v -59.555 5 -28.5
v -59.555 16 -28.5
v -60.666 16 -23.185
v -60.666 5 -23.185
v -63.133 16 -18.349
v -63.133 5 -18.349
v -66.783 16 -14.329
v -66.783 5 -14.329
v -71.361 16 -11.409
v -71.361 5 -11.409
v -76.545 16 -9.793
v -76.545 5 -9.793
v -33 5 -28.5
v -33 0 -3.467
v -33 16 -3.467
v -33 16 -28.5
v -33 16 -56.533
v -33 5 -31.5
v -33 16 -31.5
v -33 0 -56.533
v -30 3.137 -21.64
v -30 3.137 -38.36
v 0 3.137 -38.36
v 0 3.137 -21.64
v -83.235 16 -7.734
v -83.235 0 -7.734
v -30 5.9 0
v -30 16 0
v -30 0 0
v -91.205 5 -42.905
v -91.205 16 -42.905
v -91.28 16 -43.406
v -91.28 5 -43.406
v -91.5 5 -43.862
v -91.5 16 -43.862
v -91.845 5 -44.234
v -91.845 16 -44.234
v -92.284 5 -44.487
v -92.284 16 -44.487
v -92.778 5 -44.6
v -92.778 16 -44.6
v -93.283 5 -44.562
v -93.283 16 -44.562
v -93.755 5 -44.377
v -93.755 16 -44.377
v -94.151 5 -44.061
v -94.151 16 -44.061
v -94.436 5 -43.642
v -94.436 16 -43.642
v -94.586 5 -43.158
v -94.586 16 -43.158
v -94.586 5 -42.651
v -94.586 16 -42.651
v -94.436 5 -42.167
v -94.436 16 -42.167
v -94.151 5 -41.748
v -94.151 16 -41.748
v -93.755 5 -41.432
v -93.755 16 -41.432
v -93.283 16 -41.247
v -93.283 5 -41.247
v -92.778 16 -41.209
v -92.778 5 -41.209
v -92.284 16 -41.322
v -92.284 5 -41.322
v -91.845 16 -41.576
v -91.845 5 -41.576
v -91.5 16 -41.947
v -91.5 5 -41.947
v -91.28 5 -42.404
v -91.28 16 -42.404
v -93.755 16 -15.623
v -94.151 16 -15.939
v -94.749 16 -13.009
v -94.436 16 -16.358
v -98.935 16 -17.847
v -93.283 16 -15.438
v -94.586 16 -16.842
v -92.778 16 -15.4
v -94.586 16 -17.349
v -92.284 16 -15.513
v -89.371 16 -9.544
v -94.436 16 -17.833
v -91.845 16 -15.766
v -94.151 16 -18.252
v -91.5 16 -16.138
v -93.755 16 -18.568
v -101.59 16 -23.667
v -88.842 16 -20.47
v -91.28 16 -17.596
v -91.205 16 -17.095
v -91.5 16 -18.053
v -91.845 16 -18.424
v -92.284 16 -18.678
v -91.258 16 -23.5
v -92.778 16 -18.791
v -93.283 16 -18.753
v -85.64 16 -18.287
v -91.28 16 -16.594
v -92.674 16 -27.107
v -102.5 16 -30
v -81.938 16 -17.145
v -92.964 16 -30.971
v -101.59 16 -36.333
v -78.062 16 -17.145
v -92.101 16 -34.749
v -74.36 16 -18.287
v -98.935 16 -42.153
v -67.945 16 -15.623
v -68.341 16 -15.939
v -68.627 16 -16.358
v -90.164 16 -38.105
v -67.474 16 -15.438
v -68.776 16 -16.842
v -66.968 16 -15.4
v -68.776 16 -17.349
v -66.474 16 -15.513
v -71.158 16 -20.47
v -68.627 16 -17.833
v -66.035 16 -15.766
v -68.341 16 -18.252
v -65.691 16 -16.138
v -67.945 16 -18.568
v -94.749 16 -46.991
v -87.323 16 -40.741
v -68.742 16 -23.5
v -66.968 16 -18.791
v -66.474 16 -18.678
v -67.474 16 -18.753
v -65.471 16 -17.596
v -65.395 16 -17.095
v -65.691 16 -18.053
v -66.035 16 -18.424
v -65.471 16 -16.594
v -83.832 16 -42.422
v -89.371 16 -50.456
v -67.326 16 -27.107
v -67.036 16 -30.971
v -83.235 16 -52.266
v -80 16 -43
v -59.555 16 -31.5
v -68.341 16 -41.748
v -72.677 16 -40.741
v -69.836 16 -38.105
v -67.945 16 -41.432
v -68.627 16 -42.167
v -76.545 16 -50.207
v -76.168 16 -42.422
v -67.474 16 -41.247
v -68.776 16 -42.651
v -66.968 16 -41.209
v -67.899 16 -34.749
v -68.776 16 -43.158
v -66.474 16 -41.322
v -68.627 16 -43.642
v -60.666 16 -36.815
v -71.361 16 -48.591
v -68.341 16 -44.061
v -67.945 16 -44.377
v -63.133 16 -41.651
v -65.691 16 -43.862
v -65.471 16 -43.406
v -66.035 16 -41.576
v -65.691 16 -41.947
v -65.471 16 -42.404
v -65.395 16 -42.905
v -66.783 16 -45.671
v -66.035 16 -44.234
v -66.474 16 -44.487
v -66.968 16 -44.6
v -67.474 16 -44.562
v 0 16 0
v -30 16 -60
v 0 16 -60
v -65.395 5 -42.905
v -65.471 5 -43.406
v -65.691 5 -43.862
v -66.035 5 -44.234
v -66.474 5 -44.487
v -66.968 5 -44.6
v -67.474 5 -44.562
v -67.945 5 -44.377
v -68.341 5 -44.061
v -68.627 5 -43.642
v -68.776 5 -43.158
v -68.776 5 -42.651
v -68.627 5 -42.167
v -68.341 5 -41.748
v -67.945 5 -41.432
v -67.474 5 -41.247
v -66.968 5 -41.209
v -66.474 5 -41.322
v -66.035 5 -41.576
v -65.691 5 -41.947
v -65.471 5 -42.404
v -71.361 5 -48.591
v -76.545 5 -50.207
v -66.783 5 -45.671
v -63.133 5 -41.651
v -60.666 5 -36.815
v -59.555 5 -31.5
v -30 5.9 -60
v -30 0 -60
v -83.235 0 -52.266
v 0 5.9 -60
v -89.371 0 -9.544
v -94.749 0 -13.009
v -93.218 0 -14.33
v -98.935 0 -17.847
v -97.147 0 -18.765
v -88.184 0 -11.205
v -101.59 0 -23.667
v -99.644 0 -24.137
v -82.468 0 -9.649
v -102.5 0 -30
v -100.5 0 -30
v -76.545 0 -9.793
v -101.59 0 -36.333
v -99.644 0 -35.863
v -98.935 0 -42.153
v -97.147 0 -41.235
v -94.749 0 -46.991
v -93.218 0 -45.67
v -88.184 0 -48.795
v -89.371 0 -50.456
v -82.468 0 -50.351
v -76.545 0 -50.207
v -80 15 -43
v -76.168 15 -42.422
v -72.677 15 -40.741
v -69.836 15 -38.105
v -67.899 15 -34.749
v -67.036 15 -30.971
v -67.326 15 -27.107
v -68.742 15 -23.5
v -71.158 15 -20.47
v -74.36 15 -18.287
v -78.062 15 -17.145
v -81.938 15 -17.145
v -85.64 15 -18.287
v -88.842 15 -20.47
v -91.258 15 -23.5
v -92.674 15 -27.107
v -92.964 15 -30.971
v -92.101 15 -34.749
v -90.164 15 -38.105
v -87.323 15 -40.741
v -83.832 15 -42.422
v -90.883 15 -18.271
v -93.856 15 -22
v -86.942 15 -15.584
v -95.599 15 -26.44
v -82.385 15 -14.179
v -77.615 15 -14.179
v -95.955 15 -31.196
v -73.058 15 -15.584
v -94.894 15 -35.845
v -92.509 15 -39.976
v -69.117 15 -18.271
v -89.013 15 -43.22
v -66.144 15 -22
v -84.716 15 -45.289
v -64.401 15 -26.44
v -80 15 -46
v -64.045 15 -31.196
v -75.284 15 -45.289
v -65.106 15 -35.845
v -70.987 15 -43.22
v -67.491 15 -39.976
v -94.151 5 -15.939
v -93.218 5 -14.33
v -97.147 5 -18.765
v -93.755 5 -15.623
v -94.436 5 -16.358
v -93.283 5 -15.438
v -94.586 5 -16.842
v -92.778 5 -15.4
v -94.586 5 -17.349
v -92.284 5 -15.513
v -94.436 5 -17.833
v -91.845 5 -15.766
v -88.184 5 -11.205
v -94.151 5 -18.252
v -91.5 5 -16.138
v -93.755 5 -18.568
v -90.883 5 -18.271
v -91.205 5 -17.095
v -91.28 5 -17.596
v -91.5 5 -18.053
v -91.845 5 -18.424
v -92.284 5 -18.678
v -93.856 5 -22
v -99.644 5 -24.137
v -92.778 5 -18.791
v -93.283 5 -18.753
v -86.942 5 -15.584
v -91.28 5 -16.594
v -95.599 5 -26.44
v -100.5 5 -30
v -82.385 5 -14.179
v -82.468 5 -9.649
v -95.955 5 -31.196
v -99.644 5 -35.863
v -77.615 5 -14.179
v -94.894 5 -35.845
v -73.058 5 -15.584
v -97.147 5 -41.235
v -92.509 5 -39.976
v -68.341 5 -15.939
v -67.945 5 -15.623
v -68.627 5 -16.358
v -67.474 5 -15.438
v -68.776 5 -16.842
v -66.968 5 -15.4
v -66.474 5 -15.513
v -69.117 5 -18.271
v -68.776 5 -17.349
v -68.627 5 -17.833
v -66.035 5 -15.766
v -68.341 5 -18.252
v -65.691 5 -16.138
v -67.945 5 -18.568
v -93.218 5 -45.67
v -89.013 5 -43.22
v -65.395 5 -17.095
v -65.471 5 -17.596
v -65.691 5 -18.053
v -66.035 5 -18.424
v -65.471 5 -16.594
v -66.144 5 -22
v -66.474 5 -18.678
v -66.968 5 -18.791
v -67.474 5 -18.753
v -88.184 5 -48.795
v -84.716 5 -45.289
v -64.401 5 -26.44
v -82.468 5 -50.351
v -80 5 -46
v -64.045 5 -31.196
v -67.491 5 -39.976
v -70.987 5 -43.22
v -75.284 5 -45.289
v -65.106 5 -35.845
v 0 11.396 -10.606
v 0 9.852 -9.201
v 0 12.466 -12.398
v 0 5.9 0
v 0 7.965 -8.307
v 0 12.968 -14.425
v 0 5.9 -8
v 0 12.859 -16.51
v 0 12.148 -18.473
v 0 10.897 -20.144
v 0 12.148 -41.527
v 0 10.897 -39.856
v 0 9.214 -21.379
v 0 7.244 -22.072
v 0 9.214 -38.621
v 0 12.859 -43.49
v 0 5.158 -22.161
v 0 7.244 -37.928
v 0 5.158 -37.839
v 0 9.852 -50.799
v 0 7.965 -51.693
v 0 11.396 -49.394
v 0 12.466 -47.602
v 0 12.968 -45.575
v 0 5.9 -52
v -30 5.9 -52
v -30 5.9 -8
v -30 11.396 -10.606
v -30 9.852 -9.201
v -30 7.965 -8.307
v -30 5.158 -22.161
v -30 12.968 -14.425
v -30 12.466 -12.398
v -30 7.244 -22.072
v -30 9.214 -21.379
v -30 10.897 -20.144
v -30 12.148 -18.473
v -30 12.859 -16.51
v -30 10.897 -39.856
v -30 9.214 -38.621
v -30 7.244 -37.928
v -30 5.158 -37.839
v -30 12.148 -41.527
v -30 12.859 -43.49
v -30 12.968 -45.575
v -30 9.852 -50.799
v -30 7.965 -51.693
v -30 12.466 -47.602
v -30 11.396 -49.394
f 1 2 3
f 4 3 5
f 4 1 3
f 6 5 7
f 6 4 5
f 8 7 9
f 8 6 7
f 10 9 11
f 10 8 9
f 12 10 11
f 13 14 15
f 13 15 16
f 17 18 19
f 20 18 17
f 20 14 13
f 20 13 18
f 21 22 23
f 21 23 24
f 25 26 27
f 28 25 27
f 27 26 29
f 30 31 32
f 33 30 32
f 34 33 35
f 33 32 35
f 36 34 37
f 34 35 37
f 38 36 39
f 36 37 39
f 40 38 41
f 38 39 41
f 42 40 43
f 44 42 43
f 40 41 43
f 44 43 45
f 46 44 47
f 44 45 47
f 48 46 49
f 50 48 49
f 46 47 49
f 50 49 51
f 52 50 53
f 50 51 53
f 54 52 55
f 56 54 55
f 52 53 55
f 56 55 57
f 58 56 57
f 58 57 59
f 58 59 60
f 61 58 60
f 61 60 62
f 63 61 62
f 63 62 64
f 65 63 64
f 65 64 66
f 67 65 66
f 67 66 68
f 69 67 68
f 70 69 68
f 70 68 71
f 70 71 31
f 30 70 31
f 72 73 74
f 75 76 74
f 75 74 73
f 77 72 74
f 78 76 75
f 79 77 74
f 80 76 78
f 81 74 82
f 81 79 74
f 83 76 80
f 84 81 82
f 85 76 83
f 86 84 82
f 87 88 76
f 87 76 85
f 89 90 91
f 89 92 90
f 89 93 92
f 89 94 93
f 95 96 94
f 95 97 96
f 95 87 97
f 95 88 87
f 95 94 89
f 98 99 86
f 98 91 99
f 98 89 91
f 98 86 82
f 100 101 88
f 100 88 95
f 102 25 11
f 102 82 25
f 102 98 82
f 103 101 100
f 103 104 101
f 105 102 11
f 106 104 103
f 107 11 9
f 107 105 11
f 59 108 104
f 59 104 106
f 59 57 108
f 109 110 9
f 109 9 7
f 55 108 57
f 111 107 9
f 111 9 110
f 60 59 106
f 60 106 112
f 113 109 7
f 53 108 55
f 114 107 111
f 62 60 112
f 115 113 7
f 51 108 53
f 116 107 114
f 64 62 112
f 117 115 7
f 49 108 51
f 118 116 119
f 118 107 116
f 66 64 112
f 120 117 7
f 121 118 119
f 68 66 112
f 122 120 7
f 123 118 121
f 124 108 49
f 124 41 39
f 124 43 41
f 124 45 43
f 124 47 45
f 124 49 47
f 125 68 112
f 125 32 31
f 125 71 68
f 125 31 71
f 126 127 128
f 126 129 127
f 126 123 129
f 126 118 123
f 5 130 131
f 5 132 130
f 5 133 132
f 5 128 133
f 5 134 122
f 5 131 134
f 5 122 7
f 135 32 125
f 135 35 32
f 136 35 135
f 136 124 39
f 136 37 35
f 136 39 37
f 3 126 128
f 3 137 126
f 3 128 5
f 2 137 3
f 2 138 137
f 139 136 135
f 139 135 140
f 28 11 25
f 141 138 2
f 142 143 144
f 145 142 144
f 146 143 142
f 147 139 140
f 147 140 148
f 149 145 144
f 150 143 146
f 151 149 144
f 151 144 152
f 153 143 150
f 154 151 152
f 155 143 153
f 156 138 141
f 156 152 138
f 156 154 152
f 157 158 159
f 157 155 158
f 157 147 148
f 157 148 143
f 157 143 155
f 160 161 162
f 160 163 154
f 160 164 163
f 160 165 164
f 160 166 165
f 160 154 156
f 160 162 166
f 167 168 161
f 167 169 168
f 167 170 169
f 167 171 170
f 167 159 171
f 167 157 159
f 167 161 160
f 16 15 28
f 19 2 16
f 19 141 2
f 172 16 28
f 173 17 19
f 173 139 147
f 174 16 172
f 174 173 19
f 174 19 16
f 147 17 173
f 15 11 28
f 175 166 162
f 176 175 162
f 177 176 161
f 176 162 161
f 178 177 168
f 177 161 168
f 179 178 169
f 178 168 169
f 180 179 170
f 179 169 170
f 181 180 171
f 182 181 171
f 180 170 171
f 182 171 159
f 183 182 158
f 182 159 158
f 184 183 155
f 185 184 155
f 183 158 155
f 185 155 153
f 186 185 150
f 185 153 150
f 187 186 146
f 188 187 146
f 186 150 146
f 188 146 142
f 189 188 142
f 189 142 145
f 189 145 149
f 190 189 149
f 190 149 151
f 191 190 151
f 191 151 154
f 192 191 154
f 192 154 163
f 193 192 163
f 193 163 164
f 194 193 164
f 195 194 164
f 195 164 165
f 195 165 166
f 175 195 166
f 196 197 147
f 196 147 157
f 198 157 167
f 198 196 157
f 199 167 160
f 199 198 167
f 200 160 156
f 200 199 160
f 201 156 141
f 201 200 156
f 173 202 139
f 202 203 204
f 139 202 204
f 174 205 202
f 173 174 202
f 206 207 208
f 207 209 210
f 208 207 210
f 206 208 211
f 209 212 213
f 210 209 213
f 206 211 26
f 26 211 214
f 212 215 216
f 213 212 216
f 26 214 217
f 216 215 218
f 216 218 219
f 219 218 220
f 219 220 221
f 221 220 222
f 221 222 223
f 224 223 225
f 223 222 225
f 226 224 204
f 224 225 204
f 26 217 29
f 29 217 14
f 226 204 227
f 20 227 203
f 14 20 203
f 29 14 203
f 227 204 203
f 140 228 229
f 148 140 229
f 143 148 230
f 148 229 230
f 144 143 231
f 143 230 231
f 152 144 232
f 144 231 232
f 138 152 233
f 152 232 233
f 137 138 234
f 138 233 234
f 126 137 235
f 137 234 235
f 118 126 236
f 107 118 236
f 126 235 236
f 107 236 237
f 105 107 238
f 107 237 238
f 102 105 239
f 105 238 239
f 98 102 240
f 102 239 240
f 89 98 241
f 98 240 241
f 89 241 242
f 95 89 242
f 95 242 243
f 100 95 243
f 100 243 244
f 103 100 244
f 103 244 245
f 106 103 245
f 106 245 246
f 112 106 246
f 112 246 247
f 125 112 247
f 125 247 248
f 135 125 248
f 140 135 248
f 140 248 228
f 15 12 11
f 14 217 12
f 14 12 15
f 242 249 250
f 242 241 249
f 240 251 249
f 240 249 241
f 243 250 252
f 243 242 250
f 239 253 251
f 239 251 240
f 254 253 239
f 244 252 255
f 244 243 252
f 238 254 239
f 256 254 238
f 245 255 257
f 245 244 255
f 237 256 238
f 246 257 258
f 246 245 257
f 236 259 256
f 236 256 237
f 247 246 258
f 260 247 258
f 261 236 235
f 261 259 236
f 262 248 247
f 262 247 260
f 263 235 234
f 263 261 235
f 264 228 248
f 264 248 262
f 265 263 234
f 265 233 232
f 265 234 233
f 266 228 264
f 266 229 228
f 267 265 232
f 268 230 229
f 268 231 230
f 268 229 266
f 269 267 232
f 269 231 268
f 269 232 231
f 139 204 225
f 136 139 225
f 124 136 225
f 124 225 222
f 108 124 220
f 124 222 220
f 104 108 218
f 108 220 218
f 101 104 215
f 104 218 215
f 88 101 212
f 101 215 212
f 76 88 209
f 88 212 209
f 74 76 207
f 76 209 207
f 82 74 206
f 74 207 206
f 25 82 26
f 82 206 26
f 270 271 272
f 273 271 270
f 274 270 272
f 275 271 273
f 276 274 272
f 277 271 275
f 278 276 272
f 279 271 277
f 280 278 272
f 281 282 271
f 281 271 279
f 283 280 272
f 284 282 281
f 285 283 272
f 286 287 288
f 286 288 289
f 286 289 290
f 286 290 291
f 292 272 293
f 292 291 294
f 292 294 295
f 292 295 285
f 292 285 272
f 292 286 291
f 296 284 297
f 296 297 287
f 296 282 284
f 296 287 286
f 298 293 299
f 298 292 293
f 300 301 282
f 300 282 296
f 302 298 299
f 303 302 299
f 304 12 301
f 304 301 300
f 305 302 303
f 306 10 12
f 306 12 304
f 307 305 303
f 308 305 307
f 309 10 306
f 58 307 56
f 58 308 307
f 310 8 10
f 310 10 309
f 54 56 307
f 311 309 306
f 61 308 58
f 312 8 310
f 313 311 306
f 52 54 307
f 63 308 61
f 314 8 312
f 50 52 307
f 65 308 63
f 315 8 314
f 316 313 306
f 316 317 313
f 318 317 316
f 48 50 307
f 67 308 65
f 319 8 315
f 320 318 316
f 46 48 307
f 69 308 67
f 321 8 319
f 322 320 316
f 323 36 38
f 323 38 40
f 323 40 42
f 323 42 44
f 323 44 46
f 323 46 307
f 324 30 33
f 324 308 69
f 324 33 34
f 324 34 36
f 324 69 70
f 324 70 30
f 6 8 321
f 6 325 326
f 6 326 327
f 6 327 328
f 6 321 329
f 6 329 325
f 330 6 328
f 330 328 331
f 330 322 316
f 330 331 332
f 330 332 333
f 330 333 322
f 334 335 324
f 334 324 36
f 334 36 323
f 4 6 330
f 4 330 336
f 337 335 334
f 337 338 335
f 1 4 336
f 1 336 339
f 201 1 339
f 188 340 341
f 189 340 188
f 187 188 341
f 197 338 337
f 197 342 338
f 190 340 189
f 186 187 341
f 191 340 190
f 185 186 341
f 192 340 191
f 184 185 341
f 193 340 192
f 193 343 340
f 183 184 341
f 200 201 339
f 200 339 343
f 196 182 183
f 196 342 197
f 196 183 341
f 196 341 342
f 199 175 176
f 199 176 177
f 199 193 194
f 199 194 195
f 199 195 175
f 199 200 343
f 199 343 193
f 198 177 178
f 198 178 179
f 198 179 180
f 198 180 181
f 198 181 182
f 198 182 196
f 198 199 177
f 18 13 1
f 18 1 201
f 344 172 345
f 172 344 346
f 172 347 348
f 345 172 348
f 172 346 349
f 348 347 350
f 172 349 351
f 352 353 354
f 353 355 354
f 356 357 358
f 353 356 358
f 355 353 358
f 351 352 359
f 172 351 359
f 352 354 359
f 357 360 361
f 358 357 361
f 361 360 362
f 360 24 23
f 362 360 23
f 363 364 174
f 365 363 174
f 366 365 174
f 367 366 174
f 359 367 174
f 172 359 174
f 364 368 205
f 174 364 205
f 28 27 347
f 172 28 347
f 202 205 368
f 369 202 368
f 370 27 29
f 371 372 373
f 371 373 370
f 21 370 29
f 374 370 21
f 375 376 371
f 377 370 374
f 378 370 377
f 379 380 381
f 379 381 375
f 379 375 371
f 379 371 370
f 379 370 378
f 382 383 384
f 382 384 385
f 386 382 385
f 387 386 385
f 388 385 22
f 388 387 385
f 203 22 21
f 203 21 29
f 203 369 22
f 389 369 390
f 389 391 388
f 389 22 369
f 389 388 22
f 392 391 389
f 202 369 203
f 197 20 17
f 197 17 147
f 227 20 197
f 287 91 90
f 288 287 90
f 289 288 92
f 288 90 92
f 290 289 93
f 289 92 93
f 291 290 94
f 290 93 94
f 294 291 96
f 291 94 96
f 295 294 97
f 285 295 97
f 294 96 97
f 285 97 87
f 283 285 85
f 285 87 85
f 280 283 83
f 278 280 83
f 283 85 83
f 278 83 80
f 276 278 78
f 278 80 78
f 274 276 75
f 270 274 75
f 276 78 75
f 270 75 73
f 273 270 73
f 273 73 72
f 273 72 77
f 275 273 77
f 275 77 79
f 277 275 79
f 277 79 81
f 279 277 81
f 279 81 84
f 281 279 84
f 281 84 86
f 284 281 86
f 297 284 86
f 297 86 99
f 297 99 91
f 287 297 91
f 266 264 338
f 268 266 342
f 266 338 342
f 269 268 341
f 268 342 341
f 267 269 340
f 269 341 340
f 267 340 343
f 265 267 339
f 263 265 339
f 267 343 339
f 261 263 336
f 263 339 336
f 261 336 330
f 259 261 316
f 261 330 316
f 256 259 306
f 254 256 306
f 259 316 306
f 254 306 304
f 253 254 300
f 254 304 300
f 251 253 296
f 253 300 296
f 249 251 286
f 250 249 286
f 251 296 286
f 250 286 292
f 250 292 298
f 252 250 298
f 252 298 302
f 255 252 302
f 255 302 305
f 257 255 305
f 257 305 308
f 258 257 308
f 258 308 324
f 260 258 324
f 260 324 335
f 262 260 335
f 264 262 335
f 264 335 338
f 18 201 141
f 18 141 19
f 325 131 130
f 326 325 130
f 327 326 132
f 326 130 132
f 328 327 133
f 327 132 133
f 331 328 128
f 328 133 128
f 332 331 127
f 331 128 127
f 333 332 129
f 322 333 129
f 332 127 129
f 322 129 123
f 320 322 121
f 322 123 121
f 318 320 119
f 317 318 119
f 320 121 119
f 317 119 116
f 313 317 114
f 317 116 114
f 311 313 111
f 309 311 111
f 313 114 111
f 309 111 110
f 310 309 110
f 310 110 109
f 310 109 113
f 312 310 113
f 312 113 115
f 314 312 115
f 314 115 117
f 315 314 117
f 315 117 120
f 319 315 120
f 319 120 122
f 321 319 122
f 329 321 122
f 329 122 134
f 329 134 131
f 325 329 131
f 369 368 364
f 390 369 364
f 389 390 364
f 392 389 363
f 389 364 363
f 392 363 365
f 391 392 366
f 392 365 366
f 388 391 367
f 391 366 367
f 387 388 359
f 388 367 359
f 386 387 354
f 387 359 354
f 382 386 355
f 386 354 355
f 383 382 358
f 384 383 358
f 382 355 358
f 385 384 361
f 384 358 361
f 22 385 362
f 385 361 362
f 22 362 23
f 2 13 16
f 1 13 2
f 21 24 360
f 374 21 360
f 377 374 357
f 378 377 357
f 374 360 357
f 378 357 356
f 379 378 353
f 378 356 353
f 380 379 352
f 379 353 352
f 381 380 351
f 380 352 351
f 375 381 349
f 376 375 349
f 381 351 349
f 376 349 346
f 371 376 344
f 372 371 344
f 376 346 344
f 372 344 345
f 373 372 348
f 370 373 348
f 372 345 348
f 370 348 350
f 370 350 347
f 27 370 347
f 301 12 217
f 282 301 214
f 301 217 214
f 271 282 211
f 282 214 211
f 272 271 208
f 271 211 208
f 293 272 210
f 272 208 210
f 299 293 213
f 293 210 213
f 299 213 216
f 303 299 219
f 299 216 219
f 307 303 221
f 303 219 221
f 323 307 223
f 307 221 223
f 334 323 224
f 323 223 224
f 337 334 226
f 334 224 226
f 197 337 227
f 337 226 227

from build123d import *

# Parameters (mm, degrees)
EXTRUDE_1_DEPTH      = 16
SKETCH_2_R           = 16
CUT_EXTRUDE_1_DEPTH  = 15
SKETCH_3_R           = 13
CUT_EXTRUDE_2_DEPTH  = 120.713198938
SKETCH_4_R           = 20.5
CUT_EXTRUDE_3_DEPTH  = 5
HOLE_WIZARD_M32_D    = 3.4
CUT_EXTRUDE_8_DEPTH  = 30
CUT_EXTRUDE_11_DEPTH = 120.842605112
EXTRUDE_2_DEPTH      = 11


with BuildPart() as part:
    # Эскиз1 → Бобышка-Вытянуть1 (new body)
    with BuildSketch(Plane(origin=(0, 0, 0), x_dir=(1, 0, 0), z_dir=(0, 1, 0))):
        with BuildLine():
            Line((0, 0), (0, 60))
            Line((0, 60), (-30, 60))
            Line((-30, 60), (-83.234756238, 52.266260397))
            ThreePointArc((-83.234756238, 52.266260397), (-102.5, 30), (-83.234756238, 7.733739603))
            Line((-83.234756238, 7.733739603), (-30, 0))
            Line((-30, 0), (0, 0))
        make_face()
    extrude(amount=EXTRUDE_1_DEPTH)

    # Эскиз2 → Вырез-Вытянуть1 (cut)
    with BuildSketch(Plane.XZ):
        with Locations(Location((-80, -30, 0), (0, 0, 270))):
            Circle(SKETCH_2_R)
    extrude(amount=-CUT_EXTRUDE_1_DEPTH, mode=Mode.SUBTRACT)

    # Эскиз3 → Вырез-Вытянуть2 (cut, through all)
    with BuildSketch(Plane.XZ.offset(-15)):
        with Locations(Location((-80, -30, 0), (0, 0, 270))):
            Circle(SKETCH_3_R)
    extrude(amount=-CUT_EXTRUDE_2_DEPTH, mode=Mode.SUBTRACT)

    # Эскиз4 → Вырез-Вытянуть3 (cut)
    with BuildSketch(Plane.XZ):
        with Locations(Location((-80, -30, 0), (0, 0, 270))):
            Circle(SKETCH_4_R)
    extrude(amount=-CUT_EXTRUDE_3_DEPTH, mode=Mode.SUBTRACT)

    # Отверстие с зазором M32 (through all)
    with Locations(Plane(origin=(0, 5, 0), x_dir=(-1, 0, 0), z_dir=(0, -1, 0))):
        with Locations((92.904698757, 17.095301243), (67.095301243, 17.095301243), (67.095301243, 42.904698757), (92.904698757, 42.904698757)):
            Hole(HOLE_WIZARD_M32_D / 2)

    # Эскиз8 → Вырез-Вытянуть8 (cut)
    with BuildSketch(Plane(origin=(0, 0, 0), x_dir=(0, 0, -1), z_dir=(1, 0, 0))):
        with BuildLine():
            Line((38.359861864, 3.136561351), (21.640138136, 3.136561351))
            ThreePointArc((21.640138136, 3.136561351), (16.509790629, 12.858627047), (8, 5.9))
            Line((8, 5.9), (0, 5.9))
            Line((0, 5.9), (0, 0))
            Line((0, 0), (60, 0))
            Line((60, 0), (60, 5.9))
            Line((60, 5.9), (52, 5.9))
            ThreePointArc((52, 5.9), (43.490209371, 12.858627047), (38.359861864, 3.136561351))
        make_face()
    extrude(amount=-CUT_EXTRUDE_8_DEPTH, mode=Mode.SUBTRACT)

    # Эскиз14 → Вырез-Вытянуть11 (cut, through all)
    with BuildSketch(Plane.XZ):
        with BuildLine():
            Line((-33, -56.53267916), (-76.544602266, -50.206687668))
            ThreePointArc((-76.544602266, -50.206687668), (-59.5, -30), (-76.544602266, -9.793312332))
            Line((-76.544602266, -9.793312332), (-33, -3.46732084))
            Line((-33, -3.46732084), (-33, -56.53267916))
        make_face()
    extrude(amount=-CUT_EXTRUDE_11_DEPTH, mode=Mode.SUBTRACT)

    # Эскиз15 → Бобышка-Вытянуть2 (add, through all)
    with BuildSketch(Plane.XZ.offset(-5)):
        with BuildLine():
            Line((-59.5549517, -31.5), (-33, -31.5))
            Line((-33, -31.5), (-33, -28.5))
            Line((-33, -28.5), (-59.5549517, -28.5))
            ThreePointArc((-59.5549517, -28.5), (-59.5, -30), (-59.5549517, -31.5))
        make_face()
    extrude(amount=-EXTRUDE_2_DEPTH)


solid = part.part
